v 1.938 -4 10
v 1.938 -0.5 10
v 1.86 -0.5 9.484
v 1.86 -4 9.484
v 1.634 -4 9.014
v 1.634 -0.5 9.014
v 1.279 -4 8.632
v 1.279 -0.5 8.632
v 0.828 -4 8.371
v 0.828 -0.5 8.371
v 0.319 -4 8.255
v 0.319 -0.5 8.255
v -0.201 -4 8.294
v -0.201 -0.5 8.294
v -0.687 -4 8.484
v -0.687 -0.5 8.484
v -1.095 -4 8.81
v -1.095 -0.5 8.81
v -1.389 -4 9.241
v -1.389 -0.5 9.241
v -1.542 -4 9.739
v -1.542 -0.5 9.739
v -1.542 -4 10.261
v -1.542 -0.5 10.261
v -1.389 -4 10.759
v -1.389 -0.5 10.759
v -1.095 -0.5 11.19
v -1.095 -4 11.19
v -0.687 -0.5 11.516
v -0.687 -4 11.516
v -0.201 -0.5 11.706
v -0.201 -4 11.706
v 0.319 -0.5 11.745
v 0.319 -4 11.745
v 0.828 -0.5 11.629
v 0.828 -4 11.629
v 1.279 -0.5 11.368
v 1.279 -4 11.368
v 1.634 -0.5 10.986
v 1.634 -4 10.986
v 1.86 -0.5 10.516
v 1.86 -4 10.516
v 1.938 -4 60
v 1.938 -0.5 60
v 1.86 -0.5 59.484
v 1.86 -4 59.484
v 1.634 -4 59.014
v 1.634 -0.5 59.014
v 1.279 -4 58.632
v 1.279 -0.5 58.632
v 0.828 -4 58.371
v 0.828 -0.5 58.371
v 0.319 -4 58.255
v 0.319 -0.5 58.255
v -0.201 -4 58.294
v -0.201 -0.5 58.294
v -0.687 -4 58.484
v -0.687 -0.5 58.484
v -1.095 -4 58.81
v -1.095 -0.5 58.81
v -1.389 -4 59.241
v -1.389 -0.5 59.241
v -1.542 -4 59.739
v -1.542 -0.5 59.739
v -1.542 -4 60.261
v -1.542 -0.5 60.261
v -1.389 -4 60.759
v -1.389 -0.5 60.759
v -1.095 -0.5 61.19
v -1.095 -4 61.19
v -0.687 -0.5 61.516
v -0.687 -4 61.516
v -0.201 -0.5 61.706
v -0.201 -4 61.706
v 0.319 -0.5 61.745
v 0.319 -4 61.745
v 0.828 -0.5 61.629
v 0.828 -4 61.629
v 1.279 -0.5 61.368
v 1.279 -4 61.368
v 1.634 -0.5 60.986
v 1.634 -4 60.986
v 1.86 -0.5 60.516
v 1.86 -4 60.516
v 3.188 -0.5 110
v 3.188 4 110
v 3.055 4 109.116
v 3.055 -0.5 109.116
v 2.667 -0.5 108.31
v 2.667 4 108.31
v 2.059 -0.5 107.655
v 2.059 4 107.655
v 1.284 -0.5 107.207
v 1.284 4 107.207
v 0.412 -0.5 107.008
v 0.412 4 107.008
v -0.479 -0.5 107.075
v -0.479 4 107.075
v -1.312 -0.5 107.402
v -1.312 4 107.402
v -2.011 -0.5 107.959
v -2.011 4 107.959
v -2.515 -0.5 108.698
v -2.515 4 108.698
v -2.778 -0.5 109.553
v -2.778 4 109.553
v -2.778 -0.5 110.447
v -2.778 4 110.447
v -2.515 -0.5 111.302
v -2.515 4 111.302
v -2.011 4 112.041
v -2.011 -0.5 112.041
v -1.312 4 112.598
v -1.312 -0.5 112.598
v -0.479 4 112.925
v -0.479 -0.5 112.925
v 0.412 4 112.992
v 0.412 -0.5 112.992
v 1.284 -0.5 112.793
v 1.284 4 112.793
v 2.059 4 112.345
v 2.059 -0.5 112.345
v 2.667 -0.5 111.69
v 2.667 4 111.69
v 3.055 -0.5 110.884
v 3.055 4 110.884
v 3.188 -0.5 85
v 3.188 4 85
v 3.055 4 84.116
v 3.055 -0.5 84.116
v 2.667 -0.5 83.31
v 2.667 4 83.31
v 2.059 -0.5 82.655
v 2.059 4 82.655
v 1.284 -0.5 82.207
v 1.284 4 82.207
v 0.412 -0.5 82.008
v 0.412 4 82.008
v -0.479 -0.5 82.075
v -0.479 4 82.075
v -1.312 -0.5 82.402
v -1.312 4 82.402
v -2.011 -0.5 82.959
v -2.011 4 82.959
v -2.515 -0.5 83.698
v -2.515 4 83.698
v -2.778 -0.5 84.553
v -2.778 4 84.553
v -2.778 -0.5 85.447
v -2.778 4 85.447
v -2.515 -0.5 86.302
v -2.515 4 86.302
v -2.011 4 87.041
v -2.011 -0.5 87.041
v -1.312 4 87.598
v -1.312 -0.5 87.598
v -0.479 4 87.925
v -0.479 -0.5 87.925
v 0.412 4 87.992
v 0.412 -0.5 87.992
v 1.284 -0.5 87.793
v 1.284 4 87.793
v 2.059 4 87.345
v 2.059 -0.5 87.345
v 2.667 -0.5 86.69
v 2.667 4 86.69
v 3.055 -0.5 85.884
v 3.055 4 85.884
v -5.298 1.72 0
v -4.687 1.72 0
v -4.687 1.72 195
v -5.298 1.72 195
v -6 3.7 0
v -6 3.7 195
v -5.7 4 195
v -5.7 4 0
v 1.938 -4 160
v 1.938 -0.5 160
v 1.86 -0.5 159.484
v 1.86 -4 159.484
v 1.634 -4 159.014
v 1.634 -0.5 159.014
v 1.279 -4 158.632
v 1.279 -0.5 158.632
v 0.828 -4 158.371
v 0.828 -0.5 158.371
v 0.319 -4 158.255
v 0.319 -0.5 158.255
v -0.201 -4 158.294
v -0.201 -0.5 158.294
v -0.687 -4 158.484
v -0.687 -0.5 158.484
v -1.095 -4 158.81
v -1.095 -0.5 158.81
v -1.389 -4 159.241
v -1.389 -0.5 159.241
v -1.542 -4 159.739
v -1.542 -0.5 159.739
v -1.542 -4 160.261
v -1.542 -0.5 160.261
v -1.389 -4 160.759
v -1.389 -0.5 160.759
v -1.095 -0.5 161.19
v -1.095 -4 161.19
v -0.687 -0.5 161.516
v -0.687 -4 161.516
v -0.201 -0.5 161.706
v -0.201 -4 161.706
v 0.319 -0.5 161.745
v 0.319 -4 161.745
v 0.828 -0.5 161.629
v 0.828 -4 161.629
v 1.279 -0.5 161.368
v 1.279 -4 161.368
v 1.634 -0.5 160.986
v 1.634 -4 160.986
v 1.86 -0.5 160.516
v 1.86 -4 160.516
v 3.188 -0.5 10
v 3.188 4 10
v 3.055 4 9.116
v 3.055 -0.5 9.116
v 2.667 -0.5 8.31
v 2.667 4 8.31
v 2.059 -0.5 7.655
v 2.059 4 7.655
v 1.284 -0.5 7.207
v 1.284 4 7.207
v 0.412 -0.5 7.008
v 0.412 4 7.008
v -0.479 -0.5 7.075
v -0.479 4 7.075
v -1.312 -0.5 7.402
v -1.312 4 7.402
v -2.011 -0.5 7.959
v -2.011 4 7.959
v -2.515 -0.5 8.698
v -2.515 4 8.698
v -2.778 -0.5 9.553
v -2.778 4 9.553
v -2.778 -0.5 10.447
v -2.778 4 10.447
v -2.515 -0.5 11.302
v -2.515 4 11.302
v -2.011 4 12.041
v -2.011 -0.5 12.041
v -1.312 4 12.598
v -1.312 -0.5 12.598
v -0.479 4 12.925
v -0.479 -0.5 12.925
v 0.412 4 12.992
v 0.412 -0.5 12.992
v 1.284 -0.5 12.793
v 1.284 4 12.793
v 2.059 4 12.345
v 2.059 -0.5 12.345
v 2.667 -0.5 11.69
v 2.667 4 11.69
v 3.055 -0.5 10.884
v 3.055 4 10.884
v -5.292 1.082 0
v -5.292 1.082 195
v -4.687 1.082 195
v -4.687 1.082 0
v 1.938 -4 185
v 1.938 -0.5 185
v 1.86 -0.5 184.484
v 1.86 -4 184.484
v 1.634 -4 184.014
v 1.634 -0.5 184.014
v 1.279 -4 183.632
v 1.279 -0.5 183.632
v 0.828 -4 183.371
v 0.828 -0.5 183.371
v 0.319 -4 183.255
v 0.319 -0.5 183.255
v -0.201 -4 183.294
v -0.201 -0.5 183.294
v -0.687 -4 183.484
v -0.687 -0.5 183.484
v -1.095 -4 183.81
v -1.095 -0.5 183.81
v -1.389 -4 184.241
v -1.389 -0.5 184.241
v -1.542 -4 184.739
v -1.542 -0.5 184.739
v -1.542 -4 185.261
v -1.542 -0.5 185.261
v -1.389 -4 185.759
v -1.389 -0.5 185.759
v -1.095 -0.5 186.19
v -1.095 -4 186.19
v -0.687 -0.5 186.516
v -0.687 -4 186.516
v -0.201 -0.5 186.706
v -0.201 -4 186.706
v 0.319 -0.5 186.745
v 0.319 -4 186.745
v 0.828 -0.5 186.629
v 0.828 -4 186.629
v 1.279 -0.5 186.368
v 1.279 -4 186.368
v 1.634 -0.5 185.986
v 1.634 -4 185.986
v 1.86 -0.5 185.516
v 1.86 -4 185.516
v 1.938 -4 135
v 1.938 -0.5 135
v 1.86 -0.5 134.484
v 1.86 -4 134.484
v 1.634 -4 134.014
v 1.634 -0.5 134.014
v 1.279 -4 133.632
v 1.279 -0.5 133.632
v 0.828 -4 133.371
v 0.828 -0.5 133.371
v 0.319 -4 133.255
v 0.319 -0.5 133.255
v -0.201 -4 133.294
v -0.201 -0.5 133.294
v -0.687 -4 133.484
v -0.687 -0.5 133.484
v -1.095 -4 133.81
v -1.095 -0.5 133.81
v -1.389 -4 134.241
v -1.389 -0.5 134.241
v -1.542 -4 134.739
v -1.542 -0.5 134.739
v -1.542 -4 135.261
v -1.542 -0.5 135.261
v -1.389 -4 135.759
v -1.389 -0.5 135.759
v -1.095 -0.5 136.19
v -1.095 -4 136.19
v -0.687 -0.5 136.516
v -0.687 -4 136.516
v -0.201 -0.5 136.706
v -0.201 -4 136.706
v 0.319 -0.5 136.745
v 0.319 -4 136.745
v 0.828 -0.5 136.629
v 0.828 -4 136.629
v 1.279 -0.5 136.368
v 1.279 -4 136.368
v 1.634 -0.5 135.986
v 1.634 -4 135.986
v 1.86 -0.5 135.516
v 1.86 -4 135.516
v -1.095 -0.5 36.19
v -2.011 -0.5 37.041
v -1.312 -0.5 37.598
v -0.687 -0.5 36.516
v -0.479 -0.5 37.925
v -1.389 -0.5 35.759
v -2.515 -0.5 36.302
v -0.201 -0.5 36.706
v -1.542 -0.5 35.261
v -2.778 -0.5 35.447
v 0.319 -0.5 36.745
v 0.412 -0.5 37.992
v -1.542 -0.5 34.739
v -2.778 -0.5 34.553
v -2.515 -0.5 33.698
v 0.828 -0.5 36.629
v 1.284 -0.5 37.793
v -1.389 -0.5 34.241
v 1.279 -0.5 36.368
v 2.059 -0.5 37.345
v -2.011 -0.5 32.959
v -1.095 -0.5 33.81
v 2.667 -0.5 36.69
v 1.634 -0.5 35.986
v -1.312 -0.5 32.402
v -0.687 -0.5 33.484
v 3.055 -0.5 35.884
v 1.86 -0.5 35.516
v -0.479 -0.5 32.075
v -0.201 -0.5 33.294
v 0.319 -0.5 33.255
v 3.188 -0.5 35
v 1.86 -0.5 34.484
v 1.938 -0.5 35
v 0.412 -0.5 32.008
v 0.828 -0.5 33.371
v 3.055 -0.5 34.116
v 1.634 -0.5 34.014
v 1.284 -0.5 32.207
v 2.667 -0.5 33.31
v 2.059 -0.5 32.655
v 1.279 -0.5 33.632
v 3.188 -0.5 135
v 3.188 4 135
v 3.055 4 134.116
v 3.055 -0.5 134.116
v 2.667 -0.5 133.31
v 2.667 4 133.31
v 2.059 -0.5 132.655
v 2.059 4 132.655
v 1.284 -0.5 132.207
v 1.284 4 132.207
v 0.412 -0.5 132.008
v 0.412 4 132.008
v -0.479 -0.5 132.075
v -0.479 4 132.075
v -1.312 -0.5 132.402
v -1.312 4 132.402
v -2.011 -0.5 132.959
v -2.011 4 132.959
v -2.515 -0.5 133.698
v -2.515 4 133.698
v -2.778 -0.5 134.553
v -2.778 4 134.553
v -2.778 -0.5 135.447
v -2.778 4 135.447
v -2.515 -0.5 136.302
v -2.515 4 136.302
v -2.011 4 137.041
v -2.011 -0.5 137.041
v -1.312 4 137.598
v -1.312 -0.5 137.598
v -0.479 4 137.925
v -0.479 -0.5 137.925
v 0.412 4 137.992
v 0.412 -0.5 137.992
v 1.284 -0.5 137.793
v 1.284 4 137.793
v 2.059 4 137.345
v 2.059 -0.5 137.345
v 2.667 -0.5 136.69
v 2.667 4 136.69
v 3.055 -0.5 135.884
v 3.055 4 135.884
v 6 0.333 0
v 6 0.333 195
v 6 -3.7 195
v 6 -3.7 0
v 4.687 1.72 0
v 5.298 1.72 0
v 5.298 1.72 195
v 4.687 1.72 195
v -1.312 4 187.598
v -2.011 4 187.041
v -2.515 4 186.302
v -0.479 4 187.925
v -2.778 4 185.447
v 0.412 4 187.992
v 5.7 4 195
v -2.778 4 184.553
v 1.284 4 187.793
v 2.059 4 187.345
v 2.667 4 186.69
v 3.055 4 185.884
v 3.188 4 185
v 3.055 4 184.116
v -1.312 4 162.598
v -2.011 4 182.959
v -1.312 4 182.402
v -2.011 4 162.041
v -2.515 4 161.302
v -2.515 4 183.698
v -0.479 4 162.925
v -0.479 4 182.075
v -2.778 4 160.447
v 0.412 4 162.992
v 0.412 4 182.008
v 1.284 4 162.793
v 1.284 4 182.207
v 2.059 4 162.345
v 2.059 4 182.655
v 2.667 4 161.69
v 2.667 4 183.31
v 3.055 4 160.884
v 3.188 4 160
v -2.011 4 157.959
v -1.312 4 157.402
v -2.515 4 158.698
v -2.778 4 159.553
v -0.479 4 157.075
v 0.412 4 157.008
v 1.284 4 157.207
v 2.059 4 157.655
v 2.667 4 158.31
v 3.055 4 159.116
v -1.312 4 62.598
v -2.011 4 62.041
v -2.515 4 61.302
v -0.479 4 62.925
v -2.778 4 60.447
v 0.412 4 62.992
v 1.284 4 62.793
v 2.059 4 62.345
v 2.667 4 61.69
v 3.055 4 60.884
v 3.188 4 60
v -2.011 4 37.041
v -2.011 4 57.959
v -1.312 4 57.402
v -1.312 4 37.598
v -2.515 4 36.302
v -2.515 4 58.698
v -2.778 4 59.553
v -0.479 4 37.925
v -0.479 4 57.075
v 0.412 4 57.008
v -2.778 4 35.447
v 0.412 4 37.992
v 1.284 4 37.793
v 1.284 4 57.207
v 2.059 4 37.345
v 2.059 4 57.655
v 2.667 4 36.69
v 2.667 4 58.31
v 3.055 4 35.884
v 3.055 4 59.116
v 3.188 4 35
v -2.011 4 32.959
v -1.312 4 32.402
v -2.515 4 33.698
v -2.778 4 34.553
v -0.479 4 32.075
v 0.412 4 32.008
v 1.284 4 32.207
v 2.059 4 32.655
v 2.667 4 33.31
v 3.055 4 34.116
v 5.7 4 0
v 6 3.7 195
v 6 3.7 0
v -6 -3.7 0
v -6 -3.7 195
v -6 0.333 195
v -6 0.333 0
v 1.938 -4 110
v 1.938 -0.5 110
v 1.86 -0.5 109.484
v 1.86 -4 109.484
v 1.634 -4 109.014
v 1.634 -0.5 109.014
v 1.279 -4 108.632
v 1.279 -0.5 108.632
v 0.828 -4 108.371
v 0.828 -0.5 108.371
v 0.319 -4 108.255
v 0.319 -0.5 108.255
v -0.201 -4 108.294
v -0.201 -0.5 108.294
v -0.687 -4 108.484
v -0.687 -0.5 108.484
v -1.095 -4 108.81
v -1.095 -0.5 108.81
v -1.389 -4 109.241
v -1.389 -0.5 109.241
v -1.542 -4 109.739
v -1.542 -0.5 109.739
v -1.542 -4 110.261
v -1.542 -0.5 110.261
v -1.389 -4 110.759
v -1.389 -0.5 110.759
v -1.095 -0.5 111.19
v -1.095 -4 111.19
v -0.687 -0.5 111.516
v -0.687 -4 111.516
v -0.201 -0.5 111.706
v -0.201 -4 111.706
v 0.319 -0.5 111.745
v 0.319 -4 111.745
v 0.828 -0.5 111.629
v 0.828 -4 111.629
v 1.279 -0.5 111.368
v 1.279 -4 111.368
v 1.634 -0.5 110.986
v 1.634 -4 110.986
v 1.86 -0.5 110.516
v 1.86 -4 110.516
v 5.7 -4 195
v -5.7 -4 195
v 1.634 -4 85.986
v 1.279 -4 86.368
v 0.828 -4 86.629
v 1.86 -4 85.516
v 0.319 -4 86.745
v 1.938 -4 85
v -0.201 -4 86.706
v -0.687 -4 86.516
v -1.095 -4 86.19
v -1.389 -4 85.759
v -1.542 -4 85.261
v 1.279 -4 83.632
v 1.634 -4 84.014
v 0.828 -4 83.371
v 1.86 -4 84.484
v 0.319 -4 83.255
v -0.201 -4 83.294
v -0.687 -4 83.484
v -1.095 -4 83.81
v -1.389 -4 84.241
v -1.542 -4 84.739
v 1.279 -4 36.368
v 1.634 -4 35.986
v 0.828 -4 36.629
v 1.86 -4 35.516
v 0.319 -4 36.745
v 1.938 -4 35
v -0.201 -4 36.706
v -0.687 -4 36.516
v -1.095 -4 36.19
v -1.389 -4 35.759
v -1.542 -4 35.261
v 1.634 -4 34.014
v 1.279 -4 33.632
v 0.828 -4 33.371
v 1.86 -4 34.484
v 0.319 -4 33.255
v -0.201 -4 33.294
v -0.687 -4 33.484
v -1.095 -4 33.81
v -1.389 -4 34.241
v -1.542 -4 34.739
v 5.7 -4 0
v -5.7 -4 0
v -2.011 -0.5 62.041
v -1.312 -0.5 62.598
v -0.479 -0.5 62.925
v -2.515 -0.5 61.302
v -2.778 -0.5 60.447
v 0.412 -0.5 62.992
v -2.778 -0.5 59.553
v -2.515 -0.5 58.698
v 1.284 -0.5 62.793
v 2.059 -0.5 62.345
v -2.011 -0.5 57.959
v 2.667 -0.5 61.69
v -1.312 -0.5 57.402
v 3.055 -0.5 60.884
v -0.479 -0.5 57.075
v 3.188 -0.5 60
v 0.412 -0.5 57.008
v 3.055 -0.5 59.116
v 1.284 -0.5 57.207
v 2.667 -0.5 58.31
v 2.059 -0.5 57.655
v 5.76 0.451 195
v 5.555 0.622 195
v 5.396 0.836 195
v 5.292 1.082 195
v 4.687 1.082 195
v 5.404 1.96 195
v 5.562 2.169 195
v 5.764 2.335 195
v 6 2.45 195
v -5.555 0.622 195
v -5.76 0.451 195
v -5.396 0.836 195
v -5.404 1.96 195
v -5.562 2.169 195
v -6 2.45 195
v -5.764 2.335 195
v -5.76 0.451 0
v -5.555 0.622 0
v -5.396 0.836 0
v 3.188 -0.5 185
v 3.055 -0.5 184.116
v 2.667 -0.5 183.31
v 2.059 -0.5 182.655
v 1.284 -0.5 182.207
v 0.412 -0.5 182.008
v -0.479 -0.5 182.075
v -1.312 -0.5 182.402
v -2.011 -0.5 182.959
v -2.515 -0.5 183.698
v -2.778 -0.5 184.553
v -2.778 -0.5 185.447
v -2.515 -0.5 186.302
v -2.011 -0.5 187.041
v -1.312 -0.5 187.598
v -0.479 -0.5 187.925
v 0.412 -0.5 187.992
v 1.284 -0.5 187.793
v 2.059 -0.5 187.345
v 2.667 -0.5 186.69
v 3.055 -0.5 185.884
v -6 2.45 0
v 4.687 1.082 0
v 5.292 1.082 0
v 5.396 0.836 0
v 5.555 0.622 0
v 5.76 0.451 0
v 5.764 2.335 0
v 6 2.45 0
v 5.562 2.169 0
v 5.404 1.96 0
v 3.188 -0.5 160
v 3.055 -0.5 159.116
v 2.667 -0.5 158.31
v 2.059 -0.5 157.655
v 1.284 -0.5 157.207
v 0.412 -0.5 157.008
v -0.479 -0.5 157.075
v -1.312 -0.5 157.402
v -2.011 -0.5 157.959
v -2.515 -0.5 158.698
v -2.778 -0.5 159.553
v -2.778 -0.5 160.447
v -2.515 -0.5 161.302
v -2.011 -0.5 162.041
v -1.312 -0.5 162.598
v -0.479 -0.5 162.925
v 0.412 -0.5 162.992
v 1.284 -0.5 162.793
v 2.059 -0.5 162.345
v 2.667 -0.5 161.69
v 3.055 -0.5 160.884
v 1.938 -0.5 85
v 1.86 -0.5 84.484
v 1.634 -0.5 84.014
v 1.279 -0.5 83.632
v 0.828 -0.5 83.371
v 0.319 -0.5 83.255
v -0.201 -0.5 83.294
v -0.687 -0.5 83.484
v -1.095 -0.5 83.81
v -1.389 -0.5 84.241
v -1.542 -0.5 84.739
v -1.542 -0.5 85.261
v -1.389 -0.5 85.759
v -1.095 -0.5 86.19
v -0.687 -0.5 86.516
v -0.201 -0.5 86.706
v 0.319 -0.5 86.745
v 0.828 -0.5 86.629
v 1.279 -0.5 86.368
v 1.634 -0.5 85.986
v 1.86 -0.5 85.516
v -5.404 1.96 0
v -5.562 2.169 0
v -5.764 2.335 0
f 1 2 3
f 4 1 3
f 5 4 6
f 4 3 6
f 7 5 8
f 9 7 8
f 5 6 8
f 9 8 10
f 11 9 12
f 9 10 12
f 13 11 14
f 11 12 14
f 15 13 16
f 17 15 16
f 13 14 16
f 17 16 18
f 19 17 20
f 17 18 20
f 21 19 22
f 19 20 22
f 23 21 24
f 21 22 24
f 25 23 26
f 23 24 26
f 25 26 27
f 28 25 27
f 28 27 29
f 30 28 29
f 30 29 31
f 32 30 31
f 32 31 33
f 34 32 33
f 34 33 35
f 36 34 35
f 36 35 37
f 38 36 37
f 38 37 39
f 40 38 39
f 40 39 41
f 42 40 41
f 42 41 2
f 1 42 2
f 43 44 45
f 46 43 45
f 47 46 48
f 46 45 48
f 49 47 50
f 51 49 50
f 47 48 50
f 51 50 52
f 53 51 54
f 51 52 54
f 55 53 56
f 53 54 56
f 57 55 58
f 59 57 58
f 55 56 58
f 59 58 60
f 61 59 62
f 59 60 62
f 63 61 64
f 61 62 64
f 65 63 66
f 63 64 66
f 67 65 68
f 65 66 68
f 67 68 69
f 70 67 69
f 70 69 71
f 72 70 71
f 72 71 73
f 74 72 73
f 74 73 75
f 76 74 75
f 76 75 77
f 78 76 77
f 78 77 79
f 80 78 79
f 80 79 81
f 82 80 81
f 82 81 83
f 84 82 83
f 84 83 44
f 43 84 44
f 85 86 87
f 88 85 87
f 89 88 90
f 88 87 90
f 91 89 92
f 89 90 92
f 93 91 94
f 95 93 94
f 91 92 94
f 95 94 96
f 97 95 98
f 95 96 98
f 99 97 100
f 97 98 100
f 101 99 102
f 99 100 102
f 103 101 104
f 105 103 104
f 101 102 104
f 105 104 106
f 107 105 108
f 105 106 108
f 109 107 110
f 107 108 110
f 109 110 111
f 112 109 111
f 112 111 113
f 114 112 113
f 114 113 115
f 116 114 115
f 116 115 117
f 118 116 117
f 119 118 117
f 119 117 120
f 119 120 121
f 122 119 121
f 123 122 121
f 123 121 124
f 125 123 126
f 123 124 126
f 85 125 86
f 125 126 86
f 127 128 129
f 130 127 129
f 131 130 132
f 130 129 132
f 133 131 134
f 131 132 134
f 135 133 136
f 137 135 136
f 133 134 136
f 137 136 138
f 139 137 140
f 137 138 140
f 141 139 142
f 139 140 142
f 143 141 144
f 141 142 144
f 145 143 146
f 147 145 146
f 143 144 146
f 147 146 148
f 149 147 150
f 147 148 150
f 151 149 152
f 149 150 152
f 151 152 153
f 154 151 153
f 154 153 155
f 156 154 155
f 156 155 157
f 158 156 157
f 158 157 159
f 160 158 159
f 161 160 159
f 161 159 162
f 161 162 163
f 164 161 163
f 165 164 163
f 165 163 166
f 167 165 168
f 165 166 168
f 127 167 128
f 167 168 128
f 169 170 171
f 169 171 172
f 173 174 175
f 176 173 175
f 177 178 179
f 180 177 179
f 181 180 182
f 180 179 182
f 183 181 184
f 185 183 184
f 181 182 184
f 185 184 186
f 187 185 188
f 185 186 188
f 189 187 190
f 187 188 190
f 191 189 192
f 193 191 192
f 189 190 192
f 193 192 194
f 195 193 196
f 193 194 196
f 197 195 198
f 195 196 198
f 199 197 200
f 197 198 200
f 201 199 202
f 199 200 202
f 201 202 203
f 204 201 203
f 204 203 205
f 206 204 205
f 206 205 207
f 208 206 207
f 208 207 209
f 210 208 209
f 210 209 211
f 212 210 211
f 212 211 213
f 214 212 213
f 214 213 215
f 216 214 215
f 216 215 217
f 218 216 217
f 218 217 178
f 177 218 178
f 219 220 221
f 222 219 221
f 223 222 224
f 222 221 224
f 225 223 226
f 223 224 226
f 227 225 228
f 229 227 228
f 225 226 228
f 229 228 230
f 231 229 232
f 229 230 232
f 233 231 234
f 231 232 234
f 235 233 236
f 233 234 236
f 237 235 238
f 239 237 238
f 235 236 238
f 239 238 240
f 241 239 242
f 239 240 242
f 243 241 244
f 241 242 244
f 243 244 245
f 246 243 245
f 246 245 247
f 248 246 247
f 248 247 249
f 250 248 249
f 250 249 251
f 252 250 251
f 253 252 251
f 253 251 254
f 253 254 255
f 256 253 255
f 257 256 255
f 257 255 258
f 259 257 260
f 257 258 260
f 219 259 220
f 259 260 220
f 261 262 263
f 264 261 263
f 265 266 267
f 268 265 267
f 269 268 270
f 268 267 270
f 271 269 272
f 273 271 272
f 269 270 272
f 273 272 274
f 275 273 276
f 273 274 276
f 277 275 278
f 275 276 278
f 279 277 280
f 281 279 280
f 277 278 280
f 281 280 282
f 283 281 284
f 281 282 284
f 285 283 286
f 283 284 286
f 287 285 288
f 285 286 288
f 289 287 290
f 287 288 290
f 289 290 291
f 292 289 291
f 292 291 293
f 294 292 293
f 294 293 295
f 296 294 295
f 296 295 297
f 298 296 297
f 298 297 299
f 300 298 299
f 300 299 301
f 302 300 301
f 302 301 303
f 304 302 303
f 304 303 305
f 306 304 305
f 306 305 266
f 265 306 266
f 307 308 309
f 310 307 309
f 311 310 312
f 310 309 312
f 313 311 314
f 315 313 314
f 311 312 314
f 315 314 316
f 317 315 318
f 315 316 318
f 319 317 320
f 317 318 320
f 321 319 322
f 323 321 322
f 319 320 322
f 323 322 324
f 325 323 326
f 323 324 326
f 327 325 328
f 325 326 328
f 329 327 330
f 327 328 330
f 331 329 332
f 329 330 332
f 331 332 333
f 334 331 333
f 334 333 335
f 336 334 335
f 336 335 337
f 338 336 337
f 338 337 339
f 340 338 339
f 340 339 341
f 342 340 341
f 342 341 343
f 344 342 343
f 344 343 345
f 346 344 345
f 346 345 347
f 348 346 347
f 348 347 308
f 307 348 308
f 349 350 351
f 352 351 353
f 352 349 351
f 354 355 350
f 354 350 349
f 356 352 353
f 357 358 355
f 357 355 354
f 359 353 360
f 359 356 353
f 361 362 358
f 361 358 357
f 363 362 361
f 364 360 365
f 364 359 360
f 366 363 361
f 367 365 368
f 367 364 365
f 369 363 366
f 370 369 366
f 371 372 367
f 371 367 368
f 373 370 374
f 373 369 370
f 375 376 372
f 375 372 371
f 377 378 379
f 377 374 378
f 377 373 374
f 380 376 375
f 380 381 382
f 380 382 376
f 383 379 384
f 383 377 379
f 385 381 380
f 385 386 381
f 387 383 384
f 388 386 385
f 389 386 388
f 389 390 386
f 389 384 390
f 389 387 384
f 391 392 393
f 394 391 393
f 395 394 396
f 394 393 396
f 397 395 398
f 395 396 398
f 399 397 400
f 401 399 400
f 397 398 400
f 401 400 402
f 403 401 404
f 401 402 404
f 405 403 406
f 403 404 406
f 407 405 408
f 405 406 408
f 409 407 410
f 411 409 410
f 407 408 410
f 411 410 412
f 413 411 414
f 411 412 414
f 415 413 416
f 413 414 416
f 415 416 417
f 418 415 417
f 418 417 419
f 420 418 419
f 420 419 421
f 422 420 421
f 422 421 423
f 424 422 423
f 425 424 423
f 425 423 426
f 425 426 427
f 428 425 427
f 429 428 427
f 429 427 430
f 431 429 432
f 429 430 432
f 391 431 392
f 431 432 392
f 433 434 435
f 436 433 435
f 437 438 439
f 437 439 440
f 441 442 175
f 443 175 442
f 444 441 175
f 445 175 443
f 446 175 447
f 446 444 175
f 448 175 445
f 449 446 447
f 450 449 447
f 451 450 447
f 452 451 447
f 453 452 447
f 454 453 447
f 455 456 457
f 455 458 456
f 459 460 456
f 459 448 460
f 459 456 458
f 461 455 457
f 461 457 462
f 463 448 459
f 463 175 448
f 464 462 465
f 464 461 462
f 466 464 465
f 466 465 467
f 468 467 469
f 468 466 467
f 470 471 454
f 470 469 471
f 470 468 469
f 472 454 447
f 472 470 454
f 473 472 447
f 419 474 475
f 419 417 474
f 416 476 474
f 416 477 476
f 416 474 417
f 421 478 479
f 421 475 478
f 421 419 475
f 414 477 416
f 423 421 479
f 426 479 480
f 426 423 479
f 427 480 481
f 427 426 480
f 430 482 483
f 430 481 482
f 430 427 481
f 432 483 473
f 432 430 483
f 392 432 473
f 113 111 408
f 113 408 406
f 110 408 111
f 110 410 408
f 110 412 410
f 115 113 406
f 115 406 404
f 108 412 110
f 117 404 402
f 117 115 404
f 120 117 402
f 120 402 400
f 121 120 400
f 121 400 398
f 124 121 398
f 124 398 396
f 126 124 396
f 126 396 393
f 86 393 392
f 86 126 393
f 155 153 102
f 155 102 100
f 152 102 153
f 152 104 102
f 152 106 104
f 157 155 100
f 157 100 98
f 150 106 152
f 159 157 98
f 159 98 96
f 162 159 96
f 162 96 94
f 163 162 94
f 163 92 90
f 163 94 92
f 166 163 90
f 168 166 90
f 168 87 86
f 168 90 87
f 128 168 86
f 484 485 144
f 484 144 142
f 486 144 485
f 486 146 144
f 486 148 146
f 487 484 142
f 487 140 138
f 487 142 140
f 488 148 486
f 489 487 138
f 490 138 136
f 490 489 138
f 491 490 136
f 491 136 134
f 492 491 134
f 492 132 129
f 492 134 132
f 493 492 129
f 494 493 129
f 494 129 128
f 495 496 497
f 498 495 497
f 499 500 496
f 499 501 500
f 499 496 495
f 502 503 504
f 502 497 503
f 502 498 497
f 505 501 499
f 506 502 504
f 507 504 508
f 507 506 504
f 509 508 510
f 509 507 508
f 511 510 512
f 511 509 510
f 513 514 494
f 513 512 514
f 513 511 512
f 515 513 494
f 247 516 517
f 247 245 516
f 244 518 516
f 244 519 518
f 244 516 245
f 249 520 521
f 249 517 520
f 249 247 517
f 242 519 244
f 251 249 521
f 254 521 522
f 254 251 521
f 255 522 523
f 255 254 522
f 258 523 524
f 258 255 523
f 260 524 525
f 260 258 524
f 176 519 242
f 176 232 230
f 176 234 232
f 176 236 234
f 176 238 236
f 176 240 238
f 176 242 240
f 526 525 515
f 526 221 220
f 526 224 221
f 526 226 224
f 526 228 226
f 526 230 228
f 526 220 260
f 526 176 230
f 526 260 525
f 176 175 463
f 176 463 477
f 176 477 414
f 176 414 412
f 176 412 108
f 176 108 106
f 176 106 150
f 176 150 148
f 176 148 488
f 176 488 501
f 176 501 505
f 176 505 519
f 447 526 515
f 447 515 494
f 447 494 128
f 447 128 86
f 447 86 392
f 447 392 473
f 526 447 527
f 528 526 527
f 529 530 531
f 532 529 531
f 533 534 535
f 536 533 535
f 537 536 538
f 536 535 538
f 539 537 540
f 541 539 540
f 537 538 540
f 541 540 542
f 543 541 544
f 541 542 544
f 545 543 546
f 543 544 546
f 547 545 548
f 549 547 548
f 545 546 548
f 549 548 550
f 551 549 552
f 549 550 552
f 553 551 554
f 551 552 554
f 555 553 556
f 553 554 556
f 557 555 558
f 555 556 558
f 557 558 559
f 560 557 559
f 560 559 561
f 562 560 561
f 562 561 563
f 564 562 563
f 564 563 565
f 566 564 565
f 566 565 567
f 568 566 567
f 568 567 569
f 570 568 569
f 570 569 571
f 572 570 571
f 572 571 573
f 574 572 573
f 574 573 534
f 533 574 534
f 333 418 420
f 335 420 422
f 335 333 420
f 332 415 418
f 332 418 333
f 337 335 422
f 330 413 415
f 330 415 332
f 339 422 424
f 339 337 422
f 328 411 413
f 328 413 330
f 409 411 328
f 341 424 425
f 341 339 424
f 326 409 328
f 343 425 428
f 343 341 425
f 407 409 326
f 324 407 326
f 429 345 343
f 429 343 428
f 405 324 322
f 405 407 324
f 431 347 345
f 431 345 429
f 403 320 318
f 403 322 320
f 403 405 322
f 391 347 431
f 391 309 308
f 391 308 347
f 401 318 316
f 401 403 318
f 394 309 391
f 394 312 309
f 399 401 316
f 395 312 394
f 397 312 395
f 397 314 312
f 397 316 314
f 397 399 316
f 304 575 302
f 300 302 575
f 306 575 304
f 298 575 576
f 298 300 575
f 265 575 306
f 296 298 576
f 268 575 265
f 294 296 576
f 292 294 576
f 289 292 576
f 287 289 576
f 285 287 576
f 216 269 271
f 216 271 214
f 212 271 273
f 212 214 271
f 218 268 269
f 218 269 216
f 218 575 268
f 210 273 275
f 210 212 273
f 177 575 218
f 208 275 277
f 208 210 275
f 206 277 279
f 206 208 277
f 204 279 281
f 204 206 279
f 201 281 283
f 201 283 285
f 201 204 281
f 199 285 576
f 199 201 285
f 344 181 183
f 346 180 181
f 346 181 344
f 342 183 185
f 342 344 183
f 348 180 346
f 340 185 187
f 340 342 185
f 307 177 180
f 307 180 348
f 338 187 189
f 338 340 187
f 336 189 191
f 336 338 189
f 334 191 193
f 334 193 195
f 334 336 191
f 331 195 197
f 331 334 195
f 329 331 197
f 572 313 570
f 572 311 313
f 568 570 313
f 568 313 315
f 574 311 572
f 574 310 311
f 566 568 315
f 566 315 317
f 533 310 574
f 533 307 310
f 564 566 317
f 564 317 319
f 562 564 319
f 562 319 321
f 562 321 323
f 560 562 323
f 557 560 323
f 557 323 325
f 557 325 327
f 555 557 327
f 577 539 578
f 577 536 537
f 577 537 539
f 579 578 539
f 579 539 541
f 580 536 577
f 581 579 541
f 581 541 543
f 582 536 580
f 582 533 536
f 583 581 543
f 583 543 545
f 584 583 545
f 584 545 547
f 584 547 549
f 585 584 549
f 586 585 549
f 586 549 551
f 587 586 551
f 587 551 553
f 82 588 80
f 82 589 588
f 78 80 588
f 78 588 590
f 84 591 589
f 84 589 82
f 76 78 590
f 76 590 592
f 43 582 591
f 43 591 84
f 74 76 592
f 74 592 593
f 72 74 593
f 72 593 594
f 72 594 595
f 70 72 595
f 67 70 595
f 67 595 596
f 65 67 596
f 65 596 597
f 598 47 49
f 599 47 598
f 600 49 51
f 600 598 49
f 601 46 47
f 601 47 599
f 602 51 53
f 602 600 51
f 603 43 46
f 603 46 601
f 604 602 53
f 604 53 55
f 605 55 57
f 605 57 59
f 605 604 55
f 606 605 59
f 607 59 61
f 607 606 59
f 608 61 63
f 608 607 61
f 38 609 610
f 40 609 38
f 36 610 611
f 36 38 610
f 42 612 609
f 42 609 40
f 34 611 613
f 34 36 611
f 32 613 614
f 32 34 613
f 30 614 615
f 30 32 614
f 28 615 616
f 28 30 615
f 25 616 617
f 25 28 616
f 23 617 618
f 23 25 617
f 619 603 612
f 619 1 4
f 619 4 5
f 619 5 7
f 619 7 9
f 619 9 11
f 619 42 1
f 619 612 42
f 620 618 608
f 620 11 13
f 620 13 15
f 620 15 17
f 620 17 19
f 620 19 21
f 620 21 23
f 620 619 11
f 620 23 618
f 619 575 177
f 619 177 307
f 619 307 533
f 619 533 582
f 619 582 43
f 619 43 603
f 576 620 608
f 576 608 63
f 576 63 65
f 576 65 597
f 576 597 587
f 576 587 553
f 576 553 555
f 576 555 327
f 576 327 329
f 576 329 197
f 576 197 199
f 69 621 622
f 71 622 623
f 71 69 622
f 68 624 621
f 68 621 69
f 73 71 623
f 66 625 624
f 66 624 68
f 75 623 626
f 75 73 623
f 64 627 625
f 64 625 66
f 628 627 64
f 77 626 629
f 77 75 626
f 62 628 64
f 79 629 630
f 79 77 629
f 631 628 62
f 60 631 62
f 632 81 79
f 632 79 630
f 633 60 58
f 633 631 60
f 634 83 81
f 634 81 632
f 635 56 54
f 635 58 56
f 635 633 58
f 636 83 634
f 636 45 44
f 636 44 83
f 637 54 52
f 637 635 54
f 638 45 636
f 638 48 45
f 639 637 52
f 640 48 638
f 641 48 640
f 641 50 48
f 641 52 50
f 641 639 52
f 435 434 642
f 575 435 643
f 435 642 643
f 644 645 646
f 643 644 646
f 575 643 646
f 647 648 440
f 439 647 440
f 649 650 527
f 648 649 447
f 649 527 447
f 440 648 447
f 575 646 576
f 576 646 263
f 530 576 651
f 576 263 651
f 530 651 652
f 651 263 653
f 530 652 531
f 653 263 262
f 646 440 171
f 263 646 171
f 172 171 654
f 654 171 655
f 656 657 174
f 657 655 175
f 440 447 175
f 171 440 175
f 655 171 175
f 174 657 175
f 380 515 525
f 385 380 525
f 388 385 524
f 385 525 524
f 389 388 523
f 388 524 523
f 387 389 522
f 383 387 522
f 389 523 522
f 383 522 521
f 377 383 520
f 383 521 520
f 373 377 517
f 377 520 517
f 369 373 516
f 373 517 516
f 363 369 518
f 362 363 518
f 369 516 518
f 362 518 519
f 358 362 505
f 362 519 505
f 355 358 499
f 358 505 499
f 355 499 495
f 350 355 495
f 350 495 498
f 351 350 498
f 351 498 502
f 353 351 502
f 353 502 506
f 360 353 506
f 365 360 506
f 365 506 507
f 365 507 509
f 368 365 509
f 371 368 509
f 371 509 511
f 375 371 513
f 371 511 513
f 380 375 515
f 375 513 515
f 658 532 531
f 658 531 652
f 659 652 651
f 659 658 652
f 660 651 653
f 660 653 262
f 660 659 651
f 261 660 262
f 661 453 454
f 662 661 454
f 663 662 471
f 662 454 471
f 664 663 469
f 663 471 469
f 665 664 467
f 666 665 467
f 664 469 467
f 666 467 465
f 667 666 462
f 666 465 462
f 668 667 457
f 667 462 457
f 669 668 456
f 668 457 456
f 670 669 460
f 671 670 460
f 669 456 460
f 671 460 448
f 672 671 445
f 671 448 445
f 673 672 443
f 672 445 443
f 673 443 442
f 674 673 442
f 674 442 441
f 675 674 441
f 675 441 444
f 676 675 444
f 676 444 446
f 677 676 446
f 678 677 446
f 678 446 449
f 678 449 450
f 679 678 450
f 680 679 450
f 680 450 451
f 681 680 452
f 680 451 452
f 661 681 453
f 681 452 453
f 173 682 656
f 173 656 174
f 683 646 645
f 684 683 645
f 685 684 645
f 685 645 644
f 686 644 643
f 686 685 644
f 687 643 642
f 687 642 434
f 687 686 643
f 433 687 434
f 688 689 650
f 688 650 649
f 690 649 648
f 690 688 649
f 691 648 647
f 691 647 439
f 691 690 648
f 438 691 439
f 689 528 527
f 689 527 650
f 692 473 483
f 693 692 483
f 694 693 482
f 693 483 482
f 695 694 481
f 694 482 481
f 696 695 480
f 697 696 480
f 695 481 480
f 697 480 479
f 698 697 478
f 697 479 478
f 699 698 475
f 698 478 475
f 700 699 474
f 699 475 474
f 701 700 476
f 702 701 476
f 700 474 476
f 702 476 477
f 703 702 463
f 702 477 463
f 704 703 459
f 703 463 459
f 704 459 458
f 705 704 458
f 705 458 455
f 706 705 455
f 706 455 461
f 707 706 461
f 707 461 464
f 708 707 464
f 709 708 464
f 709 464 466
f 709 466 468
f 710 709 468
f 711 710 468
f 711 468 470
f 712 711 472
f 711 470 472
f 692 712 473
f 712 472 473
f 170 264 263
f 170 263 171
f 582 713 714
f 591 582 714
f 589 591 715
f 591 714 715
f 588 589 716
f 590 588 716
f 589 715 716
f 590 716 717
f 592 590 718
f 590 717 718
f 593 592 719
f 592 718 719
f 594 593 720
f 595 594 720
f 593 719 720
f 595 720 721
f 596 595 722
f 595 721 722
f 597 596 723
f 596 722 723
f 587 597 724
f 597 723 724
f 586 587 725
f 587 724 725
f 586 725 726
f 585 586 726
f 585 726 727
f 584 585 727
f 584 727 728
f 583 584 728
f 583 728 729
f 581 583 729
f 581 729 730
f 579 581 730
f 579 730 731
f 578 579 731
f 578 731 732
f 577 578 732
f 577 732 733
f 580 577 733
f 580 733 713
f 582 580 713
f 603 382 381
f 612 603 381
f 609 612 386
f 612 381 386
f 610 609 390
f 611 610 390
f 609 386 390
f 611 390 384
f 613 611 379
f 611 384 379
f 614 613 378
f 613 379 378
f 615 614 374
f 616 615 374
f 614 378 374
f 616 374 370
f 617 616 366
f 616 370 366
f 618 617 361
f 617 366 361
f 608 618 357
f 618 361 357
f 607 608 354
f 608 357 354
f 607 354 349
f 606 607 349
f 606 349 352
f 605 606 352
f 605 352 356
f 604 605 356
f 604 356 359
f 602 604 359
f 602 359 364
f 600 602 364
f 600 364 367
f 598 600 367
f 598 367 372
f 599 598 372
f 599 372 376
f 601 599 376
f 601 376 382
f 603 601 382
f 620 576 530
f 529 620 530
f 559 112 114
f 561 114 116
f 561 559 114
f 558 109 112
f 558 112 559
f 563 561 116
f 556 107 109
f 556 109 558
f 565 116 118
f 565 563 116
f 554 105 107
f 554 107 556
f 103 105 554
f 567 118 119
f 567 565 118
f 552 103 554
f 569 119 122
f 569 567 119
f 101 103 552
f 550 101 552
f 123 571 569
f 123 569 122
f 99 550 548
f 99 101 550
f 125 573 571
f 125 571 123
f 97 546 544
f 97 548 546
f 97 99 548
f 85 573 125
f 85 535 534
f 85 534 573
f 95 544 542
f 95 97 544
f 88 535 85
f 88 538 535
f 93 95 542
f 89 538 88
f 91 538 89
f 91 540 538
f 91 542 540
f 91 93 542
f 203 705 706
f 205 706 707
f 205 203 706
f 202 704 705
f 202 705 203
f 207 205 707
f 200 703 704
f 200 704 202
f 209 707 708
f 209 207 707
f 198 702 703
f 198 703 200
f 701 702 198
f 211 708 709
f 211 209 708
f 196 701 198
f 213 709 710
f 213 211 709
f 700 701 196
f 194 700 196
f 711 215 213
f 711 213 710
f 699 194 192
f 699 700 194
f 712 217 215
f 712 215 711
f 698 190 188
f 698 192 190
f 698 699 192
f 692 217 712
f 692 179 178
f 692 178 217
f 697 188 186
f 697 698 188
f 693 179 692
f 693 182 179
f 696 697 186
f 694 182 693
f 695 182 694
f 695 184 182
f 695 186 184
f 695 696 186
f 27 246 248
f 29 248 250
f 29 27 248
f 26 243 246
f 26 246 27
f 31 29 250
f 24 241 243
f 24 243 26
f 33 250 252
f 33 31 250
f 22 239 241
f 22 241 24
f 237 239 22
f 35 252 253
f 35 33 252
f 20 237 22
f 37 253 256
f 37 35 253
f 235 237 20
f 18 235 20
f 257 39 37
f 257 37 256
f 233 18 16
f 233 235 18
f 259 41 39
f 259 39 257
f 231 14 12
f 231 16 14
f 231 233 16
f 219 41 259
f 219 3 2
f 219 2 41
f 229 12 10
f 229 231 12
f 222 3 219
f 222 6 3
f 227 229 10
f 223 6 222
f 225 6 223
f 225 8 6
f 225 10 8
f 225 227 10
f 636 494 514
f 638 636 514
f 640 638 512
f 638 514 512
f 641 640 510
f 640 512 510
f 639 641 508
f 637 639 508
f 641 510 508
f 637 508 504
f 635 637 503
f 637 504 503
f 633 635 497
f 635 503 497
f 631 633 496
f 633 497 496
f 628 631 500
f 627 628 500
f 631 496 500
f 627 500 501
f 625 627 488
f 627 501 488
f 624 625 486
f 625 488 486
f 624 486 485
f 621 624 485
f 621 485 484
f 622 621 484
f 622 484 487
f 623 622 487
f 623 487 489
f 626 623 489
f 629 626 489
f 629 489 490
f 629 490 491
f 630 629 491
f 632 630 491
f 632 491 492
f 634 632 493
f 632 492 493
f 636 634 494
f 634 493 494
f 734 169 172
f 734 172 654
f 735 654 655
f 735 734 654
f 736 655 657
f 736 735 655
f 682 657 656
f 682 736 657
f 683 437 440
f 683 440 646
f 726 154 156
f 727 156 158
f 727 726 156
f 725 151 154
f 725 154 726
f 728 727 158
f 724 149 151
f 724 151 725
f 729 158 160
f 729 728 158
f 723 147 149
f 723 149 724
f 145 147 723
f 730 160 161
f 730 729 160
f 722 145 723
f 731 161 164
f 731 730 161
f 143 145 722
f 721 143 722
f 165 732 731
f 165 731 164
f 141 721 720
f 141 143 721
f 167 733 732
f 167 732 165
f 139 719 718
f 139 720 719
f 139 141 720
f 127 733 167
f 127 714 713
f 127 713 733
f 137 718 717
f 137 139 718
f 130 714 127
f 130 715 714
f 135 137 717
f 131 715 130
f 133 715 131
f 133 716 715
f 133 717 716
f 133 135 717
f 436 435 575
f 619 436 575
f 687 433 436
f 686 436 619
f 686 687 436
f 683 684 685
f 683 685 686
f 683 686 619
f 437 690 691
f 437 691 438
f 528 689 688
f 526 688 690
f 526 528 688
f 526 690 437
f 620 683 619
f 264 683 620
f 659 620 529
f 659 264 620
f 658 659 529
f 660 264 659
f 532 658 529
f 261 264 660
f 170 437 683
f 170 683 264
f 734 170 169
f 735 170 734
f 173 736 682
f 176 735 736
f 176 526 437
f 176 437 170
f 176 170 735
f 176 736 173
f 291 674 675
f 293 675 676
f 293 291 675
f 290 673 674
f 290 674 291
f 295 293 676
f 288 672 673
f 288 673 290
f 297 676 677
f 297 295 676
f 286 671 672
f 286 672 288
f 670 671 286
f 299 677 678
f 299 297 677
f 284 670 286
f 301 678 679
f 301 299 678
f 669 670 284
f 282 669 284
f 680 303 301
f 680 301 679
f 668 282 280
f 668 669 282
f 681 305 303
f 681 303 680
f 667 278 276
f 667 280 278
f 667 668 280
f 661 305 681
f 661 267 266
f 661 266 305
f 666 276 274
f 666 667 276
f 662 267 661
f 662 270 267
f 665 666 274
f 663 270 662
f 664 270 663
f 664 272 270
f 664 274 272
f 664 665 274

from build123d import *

# Parameters (mm, degrees)
EXTRUDE_1_DEPTH        = 195
SKETCH_2_R             = 3
SKETCH_2_R_2           = 1.75
CUT_EXTRUDE_1_DEPTH    = 4.5
SKETCH_2_2_R           = 1.75
CUT_EXTRUDE_2_DEPTH    = 9
PATTERN_LINEAR_1_COUNT = 12
PATTERN_LINEAR_1_PITCH = 25


with BuildPart() as part:
    # Эскиз1 → Бобышка-Вытянуть1 (new body)
    with BuildSketch(Plane.XY):
        with BuildLine():
            Line((-6, 3.7), (-5.7, 4))
            Line((-5.7, 4), (5.7, 4))
            Line((5.7, 4), (6, 3.7))
            Line((6, 3.7), (6, 2.449776022))
            ThreePointArc((6, 2.449776022), (5.561887715, 2.168810579), (5.297911886, 1.720256551))
            Line((5.297911886, 1.720256551), (4.687472904, 1.720256551))
            Line((4.687472904, 1.720256551), (4.687472904, 1.082255421))
            Line((4.687472904, 1.082255421), (5.292171789, 1.082255421))
            ThreePointArc((5.292171789, 1.082255421), (5.554928022, 0.621665058), (6, 0.333402583))
            Line((6, 0.333402583), (6, -3.7))
            Line((6, -3.7), (5.7, -4))
            Line((5.7, -4), (-5.7, -4))
            Line((-5.7, -4), (-6, -3.7))
            Line((-6, -3.7), (-6, 0.333402583))
            ThreePointArc((-6, 0.333402583), (-5.554928022, 0.621665058), (-5.292171789, 1.082255421))
            Line((-5.292171789, 1.082255421), (-4.687472904, 1.082255421))
            Line((-4.687472904, 1.082255421), (-4.687472904, 1.720256551))
            Line((-4.687472904, 1.720256551), (-5.297911886, 1.720256551))
            ThreePointArc((-5.297911886, 1.720256551), (-5.561887715, 2.168810579), (-6, 2.449776022))
            Line((-6, 2.449776022), (-6, 3.7))
        make_face()
    extrude(amount=EXTRUDE_1_DEPTH)

    # Эскиз2 → Вырез-Вытянуть1 (cut)
    with BuildSketch(Plane(origin=(0, 4, 0), x_dir=(1, 0, 0), z_dir=(0, 1, 0))):
        with Locations((0.188190244, -10)):
            Circle(SKETCH_2_R)
        with Locations((0.188190244, -10)):
            Circle(SKETCH_2_R_2, mode=Mode.SUBTRACT)
    cut_extrude_1 = extrude(amount=-CUT_EXTRUDE_1_DEPTH, mode=Mode.SUBTRACT)

    # Эскиз2<2> → Вырез-Вытянуть2 (cut, through all)
    with BuildSketch(Plane(origin=(0, 4, 0), x_dir=(1, 0, 0), z_dir=(0, 1, 0))):
        with Locations((0.188190244, -10)):
            Circle(SKETCH_2_2_R)
    cut_extrude_2 = extrude(amount=-CUT_EXTRUDE_2_DEPTH, mode=Mode.SUBTRACT)

    # Линейный массив1: Вырез-Вытянуть1, Вырез-Вытянуть2 ×12
    with Locations(*[(0, 0, i * PATTERN_LINEAR_1_PITCH) for i in range(1, PATTERN_LINEAR_1_COUNT)]):
        add(cut_extrude_1, mode=Mode.SUBTRACT)
        add(cut_extrude_2, mode=Mode.SUBTRACT)


solid = part.part
